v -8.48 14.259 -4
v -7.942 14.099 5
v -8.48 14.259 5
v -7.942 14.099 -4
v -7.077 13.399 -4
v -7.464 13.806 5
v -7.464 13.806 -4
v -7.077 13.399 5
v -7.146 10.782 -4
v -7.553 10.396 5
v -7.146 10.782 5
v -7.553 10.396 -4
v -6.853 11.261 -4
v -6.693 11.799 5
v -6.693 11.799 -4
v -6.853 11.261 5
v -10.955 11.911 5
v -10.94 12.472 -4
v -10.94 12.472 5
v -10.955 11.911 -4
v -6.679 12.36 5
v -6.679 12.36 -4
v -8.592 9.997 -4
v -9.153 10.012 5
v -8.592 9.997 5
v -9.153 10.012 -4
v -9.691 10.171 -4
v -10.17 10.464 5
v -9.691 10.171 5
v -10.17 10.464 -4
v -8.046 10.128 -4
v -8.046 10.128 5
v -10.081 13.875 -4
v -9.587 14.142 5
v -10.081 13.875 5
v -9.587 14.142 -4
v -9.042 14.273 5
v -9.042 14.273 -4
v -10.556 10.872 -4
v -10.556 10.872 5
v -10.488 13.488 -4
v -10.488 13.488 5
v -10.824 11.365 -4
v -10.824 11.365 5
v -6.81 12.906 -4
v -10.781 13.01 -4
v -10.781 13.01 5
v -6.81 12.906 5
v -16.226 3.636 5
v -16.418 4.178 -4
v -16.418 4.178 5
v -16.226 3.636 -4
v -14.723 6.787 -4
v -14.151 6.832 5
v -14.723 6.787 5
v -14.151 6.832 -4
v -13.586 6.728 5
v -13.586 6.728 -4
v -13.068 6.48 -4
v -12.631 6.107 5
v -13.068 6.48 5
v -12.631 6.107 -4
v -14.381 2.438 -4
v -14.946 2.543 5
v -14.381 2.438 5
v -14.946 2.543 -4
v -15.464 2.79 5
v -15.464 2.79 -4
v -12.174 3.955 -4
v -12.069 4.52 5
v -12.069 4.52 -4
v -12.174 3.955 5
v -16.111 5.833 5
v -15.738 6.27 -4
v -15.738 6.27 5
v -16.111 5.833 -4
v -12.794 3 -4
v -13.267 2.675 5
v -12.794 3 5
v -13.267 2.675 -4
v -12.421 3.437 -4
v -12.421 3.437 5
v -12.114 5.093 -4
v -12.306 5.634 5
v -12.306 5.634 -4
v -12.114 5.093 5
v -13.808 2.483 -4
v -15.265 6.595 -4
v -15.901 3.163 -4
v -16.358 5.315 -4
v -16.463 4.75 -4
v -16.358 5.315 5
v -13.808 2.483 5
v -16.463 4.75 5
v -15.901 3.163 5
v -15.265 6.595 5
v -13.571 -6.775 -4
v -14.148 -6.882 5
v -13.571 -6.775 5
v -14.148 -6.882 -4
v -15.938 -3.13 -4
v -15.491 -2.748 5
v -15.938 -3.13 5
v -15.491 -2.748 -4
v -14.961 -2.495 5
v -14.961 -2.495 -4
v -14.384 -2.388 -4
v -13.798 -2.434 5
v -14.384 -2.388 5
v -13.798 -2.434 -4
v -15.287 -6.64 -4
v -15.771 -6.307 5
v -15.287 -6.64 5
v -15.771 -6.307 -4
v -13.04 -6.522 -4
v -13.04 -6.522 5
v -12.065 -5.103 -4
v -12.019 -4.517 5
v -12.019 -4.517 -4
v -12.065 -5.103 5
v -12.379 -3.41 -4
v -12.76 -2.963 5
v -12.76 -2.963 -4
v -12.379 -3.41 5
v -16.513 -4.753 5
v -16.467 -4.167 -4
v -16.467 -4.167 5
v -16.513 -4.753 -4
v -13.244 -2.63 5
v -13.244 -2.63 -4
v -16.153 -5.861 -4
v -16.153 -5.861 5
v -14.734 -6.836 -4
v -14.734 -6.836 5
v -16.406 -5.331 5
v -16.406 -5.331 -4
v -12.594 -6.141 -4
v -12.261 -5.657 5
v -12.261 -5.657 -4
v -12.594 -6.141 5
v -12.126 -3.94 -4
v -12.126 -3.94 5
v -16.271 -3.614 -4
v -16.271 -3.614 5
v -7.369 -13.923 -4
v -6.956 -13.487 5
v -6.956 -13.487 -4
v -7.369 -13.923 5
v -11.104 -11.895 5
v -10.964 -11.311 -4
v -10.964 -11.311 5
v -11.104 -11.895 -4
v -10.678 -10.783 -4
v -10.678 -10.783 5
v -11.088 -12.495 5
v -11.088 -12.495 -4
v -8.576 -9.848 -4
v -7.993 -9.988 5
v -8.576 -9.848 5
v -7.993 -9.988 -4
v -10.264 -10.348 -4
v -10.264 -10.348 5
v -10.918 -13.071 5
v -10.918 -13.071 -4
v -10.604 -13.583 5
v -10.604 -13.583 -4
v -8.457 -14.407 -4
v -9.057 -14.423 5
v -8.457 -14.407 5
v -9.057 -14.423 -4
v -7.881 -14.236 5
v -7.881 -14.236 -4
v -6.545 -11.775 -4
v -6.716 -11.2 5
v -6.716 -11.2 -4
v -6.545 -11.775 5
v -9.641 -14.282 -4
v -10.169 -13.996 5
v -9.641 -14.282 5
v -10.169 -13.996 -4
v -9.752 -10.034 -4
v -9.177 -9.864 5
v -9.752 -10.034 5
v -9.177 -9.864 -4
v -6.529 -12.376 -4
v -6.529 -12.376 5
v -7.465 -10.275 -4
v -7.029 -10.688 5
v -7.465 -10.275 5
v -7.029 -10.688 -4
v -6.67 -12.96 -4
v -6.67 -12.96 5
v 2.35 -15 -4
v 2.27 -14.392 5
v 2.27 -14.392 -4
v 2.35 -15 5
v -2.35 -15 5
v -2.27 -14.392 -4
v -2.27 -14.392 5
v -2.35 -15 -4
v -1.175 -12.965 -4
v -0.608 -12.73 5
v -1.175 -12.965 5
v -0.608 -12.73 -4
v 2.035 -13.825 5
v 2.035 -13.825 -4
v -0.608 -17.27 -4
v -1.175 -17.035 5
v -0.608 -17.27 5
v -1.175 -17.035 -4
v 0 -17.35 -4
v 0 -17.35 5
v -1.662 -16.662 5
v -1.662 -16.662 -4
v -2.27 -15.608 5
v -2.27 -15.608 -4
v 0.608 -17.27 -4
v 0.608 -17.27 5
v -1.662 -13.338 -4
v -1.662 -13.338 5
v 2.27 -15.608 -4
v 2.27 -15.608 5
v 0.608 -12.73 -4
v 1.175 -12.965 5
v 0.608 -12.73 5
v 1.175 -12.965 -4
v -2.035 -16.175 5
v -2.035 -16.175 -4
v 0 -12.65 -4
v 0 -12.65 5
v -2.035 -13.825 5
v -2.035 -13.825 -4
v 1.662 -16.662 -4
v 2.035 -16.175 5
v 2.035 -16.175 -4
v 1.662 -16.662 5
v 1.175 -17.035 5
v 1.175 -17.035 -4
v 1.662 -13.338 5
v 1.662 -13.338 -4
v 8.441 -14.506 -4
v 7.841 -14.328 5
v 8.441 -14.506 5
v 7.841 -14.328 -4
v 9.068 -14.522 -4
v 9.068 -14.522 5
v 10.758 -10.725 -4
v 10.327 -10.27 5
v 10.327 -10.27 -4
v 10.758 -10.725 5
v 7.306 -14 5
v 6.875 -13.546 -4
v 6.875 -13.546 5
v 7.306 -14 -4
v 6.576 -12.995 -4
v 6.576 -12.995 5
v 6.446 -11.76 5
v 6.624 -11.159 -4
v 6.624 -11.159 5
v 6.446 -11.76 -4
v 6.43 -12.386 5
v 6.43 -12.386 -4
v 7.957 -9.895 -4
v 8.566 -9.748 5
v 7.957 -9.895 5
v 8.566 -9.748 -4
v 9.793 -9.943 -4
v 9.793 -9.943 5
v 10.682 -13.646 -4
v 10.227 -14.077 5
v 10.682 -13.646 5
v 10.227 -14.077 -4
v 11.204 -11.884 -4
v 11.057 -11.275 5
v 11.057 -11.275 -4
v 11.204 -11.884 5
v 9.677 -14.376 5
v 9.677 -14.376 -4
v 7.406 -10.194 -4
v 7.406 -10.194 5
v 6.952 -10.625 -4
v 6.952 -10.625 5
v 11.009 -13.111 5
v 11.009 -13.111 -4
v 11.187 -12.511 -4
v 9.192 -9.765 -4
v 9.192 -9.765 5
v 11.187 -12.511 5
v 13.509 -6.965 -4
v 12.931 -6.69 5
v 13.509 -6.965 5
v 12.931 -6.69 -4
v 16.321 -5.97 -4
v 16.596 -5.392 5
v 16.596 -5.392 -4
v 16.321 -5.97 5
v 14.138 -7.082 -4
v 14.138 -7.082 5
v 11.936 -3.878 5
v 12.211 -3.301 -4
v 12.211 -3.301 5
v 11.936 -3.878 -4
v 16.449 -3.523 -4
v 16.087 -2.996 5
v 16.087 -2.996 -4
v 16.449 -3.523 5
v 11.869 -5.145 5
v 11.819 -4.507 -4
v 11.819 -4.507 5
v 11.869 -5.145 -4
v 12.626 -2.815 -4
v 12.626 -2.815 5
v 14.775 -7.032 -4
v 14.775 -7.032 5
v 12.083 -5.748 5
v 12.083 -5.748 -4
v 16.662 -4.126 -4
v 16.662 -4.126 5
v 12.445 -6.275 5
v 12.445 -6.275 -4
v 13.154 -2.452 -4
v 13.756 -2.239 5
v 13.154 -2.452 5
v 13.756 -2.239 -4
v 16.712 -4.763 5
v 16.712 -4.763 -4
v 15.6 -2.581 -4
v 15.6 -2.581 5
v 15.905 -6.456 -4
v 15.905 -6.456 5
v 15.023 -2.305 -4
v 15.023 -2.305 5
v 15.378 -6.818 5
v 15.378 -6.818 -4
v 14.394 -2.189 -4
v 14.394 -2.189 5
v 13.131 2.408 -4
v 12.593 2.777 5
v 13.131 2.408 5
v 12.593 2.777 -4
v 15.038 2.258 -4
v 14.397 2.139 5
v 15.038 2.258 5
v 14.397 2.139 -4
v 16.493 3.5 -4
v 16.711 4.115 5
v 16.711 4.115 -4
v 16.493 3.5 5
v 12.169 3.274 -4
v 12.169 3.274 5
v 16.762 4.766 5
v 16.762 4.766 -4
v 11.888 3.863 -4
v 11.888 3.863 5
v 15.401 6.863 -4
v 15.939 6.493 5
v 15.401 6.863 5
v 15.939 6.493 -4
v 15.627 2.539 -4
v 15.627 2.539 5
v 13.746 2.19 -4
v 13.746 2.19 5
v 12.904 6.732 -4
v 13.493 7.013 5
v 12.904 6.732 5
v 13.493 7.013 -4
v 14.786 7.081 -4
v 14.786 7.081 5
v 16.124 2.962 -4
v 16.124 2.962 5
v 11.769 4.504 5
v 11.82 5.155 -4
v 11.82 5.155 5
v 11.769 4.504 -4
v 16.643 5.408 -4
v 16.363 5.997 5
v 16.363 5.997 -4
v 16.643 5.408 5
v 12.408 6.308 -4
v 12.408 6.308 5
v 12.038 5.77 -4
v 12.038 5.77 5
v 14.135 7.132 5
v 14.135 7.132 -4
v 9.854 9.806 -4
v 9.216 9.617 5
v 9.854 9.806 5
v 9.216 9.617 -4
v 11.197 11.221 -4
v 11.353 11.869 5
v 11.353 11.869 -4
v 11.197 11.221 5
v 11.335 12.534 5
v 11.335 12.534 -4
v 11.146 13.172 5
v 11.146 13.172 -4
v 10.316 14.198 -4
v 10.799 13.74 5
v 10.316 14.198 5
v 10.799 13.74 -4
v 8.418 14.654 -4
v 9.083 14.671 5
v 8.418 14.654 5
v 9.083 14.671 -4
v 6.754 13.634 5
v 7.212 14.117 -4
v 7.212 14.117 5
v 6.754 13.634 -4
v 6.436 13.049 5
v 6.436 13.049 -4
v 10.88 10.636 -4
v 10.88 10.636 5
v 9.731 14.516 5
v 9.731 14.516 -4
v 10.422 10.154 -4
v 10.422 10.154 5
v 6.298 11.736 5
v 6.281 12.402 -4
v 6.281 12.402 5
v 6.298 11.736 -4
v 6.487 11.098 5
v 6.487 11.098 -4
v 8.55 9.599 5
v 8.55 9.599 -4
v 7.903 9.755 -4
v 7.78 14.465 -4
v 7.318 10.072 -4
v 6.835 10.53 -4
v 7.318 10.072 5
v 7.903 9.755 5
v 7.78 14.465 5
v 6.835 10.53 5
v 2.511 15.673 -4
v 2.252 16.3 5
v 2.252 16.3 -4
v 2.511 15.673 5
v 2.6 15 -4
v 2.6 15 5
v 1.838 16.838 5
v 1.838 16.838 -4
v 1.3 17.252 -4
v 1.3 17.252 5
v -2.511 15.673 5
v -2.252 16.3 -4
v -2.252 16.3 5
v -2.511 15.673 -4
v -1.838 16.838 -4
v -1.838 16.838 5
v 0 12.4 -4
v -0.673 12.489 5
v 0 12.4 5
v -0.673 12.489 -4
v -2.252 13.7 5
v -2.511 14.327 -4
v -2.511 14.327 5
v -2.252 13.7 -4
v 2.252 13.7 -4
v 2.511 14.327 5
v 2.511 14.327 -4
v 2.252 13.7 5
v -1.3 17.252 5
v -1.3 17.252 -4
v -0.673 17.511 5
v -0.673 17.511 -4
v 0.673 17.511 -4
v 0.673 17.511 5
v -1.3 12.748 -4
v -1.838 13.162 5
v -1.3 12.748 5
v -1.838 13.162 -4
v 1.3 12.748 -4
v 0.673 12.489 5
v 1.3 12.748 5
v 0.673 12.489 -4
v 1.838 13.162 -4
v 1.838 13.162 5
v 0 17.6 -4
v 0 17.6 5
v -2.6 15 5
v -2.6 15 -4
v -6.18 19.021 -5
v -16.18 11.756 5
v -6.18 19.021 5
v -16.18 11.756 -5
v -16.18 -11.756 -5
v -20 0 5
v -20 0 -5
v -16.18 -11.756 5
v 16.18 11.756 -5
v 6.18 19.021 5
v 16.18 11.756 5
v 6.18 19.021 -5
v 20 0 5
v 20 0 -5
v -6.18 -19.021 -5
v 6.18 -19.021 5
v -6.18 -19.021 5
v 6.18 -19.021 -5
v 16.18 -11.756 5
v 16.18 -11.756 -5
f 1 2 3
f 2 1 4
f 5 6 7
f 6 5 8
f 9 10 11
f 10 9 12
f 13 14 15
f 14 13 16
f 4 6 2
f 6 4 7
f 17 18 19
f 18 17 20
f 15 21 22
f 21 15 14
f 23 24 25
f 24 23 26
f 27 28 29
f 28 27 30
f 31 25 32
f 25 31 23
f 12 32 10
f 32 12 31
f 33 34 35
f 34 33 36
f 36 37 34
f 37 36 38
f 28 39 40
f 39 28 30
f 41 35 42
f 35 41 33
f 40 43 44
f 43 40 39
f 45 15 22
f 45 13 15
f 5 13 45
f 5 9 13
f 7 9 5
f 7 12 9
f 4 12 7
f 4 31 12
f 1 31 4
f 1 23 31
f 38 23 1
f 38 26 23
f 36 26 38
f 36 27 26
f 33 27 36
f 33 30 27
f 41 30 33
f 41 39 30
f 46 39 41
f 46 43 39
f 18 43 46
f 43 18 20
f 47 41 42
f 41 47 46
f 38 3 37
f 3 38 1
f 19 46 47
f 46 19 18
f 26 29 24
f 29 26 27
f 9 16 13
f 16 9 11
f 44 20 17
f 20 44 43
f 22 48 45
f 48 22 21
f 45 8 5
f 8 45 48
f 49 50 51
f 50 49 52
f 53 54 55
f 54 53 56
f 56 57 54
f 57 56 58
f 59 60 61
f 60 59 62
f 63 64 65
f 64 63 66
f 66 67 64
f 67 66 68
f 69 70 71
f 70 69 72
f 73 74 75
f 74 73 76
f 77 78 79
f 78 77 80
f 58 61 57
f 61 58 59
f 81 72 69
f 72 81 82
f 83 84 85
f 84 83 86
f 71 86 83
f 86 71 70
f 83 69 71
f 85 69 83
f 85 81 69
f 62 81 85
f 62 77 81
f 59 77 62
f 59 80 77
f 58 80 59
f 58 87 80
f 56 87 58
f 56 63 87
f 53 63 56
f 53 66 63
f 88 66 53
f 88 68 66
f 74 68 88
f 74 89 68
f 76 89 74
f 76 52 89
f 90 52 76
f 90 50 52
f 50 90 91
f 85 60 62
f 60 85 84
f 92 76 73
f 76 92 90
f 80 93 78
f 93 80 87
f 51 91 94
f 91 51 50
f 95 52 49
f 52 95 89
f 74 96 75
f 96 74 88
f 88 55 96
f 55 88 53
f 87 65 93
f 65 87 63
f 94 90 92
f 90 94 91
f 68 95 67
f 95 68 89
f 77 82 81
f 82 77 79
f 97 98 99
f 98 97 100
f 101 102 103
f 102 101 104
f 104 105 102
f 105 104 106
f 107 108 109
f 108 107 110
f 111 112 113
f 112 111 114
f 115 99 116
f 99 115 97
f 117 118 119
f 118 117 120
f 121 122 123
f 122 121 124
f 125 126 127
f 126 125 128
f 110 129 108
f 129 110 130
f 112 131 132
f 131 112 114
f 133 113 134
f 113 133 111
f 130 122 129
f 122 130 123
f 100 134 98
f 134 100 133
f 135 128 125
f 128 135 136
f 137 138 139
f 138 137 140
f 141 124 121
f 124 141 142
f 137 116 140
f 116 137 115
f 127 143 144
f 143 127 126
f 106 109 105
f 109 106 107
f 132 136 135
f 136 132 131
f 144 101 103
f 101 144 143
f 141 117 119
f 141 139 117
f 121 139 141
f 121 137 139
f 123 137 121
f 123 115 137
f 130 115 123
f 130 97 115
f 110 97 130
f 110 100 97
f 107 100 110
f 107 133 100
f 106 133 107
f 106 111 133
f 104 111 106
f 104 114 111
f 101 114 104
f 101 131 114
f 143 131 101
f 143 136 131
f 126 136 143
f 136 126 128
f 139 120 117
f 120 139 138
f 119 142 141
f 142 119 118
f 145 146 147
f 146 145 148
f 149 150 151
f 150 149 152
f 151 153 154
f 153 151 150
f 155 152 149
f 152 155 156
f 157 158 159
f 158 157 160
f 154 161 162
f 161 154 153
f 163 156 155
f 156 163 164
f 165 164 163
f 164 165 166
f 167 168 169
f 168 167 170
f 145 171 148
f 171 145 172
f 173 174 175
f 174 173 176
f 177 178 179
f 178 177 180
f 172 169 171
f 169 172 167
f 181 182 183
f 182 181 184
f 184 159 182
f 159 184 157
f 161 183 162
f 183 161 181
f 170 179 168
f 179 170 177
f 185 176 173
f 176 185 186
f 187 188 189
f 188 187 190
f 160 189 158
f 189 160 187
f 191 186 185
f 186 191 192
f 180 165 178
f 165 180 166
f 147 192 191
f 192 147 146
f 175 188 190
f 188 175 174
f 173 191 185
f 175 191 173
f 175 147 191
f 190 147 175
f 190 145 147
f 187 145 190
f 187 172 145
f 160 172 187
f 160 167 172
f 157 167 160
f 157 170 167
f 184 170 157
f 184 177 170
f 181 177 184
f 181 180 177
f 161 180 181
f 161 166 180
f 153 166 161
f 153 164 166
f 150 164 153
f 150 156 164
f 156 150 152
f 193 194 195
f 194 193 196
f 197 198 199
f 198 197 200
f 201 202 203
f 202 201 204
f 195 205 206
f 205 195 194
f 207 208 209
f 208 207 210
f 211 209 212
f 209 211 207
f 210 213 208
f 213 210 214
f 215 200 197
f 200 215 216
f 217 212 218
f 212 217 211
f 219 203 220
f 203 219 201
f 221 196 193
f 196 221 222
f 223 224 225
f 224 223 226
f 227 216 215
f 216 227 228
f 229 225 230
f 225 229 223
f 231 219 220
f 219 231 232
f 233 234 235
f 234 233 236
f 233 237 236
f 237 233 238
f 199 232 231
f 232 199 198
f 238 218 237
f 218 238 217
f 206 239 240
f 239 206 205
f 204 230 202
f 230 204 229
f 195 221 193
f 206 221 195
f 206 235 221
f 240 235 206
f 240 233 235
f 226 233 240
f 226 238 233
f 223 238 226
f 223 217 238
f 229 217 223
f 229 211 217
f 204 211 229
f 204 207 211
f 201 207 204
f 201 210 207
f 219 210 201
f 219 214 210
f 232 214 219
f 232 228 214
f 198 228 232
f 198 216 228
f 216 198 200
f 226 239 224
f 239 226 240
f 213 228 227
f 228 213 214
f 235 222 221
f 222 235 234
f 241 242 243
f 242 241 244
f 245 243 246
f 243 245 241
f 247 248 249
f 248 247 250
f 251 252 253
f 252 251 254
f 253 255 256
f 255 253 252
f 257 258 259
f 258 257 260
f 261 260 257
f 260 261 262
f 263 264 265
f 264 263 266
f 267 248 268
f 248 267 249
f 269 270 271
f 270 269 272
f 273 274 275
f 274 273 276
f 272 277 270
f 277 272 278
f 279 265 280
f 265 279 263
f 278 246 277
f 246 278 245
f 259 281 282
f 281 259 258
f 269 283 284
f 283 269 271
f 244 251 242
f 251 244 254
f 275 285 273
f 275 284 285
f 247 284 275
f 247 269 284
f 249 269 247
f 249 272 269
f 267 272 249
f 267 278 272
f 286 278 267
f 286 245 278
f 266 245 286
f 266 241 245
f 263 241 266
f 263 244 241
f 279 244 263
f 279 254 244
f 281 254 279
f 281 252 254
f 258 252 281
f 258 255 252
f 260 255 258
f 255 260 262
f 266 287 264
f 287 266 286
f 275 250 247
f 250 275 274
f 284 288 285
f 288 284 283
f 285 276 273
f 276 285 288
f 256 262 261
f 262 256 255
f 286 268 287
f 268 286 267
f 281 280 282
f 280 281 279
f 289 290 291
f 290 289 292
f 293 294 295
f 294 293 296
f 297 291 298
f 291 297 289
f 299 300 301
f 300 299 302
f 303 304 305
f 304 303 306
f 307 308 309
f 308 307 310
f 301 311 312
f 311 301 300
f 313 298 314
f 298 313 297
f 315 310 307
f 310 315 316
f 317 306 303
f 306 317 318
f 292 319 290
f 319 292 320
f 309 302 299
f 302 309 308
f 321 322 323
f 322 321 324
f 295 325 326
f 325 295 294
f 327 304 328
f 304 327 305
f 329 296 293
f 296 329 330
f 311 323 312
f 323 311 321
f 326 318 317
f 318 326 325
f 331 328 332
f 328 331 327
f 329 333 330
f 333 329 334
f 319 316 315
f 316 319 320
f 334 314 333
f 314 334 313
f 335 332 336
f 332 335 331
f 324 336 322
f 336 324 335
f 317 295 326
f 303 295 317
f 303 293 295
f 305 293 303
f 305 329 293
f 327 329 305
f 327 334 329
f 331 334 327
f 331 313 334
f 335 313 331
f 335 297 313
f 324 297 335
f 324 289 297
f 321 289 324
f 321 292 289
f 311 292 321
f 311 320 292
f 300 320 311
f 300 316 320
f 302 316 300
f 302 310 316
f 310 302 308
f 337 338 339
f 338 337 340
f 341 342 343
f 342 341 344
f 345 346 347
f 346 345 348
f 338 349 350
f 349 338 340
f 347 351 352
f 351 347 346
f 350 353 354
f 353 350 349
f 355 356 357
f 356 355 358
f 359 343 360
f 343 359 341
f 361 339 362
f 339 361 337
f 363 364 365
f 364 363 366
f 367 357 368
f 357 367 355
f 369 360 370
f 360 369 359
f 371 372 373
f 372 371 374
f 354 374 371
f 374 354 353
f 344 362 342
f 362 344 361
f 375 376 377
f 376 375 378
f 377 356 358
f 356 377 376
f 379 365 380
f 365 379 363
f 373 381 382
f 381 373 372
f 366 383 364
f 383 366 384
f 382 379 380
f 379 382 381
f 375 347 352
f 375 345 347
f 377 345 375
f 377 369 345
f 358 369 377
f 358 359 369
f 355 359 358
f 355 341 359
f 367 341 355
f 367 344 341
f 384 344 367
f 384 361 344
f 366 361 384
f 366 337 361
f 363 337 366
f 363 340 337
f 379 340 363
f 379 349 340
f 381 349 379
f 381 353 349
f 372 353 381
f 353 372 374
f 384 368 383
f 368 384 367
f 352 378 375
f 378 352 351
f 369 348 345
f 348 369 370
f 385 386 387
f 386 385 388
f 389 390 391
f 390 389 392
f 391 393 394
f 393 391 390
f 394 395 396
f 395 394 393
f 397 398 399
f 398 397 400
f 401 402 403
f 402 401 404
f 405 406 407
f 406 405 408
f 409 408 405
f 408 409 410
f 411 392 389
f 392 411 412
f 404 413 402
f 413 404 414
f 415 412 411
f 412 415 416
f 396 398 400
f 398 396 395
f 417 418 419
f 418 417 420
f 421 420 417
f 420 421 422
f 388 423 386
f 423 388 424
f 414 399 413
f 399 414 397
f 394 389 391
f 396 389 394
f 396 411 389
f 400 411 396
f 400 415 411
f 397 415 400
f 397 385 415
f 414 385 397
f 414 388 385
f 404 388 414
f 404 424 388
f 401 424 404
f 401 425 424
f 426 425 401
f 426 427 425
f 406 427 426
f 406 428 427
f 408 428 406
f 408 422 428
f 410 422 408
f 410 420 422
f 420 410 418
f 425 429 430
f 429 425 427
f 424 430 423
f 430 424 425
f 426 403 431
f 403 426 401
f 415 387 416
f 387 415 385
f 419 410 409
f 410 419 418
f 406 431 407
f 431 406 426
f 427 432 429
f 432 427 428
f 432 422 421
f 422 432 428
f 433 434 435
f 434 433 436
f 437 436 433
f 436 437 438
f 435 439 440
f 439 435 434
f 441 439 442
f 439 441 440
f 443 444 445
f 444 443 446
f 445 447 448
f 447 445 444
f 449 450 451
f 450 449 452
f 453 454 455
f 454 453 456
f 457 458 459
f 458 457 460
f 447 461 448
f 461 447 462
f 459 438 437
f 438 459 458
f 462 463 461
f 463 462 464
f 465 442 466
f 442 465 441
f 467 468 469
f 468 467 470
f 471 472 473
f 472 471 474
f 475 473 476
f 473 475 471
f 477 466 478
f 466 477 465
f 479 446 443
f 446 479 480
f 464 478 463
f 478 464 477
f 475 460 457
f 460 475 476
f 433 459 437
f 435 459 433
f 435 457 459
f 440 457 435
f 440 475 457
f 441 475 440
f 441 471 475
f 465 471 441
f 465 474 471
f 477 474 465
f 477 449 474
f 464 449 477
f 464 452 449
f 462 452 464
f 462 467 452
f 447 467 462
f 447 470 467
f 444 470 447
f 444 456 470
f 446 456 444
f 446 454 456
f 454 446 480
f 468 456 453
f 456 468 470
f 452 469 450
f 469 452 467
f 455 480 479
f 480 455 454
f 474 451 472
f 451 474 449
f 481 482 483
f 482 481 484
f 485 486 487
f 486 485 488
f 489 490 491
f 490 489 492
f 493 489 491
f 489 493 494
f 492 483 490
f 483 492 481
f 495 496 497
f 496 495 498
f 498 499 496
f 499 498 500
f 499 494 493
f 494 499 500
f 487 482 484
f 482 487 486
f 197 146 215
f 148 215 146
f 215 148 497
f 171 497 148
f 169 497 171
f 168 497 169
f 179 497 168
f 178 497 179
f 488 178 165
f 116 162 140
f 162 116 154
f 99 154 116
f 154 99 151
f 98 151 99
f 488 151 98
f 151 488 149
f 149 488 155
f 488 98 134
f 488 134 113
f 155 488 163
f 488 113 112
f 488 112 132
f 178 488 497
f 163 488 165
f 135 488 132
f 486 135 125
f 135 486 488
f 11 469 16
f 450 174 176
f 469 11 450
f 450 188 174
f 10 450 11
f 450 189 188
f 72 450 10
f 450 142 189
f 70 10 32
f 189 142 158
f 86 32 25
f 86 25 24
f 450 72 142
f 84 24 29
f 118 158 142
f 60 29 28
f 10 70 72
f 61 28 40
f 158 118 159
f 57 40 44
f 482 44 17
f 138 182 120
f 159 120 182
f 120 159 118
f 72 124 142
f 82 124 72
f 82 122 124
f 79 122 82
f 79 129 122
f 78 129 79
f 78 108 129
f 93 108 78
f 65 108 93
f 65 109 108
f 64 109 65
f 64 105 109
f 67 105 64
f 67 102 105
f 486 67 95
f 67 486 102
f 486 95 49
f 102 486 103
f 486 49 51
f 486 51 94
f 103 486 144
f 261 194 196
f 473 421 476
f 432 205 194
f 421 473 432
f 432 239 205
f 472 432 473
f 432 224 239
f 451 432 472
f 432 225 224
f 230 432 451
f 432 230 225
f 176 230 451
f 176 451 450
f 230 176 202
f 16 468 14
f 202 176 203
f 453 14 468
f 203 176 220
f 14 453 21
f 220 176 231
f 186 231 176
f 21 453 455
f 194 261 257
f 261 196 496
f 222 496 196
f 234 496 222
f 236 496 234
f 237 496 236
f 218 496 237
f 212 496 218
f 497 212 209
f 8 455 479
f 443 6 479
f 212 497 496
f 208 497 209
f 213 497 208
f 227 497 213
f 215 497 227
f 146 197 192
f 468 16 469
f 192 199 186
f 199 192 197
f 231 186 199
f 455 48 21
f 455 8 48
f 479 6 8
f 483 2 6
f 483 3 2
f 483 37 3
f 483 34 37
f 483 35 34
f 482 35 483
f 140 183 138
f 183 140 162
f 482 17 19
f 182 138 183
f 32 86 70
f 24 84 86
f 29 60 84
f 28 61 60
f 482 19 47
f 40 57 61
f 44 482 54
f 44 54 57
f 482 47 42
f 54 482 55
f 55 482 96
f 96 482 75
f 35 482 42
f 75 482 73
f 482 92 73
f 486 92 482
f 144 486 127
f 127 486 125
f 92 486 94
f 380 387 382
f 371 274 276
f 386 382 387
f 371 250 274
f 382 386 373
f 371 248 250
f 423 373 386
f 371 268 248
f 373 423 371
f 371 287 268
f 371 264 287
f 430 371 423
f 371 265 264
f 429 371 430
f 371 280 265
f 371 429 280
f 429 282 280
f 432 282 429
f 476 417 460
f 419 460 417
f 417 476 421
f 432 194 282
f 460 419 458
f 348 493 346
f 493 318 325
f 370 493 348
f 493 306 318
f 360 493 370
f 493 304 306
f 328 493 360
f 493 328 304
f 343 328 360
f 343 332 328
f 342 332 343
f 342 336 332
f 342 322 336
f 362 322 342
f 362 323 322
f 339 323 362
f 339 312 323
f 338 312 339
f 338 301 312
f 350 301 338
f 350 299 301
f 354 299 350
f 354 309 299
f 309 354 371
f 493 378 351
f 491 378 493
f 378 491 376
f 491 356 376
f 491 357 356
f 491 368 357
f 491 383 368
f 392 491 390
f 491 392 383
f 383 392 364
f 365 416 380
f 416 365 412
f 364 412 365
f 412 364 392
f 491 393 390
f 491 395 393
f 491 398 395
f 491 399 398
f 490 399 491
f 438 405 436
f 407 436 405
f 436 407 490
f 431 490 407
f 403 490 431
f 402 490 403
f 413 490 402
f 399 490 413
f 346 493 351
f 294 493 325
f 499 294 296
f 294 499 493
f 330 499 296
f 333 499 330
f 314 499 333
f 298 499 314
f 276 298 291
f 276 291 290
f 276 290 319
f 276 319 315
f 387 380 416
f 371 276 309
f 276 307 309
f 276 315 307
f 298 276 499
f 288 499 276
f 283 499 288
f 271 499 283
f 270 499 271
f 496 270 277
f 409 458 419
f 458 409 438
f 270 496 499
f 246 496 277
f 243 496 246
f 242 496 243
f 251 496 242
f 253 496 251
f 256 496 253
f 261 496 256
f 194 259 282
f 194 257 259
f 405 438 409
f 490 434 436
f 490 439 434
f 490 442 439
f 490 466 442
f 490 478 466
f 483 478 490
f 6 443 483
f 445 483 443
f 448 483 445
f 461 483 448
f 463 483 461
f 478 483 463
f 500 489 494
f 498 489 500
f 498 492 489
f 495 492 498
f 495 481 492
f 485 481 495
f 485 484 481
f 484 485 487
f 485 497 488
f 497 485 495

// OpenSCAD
//This is a parametric drill or tap block
//The hole diameters are specified below
//Max hole diameter is 
//2 * (rBlock - rHoles) - 2mm

nHoles = 10; //number of holes
$fn=nHoles;

rBlock = 20; //radius of block in mm

rHoles = 15; //holes will be laid-out on a 
//circle of this radius

tBlock = 10; //thickness of the block

// Vorsicht: Bohrerdurchmesser / 2.0
rMin = 2.05; //Minimum hole radius
rMax = 2.5; //Maximum hole radius

rStep = (rMax-rMin)/(nHoles-1); //hole
//radius step size

sepHoles = 360 / nHoles; //angular
//separation of holes

difference() {
	cylinder(tBlock, rBlock, rBlock, center = true);

	union() {
		for (i = [1:nHoles])
				{
    			assign (angle = i*360/nHoles, distance = rHoles, r = (i-1) * rStep + rMin)
    					{
        		rotate(angle, [0, 0, 1])
        		translate([0, distance, 1.5])
        		cylinder(h=tBlock + 1, r=r+0.1, center = true, $fn=24);
    					}
				}
			}
			};
